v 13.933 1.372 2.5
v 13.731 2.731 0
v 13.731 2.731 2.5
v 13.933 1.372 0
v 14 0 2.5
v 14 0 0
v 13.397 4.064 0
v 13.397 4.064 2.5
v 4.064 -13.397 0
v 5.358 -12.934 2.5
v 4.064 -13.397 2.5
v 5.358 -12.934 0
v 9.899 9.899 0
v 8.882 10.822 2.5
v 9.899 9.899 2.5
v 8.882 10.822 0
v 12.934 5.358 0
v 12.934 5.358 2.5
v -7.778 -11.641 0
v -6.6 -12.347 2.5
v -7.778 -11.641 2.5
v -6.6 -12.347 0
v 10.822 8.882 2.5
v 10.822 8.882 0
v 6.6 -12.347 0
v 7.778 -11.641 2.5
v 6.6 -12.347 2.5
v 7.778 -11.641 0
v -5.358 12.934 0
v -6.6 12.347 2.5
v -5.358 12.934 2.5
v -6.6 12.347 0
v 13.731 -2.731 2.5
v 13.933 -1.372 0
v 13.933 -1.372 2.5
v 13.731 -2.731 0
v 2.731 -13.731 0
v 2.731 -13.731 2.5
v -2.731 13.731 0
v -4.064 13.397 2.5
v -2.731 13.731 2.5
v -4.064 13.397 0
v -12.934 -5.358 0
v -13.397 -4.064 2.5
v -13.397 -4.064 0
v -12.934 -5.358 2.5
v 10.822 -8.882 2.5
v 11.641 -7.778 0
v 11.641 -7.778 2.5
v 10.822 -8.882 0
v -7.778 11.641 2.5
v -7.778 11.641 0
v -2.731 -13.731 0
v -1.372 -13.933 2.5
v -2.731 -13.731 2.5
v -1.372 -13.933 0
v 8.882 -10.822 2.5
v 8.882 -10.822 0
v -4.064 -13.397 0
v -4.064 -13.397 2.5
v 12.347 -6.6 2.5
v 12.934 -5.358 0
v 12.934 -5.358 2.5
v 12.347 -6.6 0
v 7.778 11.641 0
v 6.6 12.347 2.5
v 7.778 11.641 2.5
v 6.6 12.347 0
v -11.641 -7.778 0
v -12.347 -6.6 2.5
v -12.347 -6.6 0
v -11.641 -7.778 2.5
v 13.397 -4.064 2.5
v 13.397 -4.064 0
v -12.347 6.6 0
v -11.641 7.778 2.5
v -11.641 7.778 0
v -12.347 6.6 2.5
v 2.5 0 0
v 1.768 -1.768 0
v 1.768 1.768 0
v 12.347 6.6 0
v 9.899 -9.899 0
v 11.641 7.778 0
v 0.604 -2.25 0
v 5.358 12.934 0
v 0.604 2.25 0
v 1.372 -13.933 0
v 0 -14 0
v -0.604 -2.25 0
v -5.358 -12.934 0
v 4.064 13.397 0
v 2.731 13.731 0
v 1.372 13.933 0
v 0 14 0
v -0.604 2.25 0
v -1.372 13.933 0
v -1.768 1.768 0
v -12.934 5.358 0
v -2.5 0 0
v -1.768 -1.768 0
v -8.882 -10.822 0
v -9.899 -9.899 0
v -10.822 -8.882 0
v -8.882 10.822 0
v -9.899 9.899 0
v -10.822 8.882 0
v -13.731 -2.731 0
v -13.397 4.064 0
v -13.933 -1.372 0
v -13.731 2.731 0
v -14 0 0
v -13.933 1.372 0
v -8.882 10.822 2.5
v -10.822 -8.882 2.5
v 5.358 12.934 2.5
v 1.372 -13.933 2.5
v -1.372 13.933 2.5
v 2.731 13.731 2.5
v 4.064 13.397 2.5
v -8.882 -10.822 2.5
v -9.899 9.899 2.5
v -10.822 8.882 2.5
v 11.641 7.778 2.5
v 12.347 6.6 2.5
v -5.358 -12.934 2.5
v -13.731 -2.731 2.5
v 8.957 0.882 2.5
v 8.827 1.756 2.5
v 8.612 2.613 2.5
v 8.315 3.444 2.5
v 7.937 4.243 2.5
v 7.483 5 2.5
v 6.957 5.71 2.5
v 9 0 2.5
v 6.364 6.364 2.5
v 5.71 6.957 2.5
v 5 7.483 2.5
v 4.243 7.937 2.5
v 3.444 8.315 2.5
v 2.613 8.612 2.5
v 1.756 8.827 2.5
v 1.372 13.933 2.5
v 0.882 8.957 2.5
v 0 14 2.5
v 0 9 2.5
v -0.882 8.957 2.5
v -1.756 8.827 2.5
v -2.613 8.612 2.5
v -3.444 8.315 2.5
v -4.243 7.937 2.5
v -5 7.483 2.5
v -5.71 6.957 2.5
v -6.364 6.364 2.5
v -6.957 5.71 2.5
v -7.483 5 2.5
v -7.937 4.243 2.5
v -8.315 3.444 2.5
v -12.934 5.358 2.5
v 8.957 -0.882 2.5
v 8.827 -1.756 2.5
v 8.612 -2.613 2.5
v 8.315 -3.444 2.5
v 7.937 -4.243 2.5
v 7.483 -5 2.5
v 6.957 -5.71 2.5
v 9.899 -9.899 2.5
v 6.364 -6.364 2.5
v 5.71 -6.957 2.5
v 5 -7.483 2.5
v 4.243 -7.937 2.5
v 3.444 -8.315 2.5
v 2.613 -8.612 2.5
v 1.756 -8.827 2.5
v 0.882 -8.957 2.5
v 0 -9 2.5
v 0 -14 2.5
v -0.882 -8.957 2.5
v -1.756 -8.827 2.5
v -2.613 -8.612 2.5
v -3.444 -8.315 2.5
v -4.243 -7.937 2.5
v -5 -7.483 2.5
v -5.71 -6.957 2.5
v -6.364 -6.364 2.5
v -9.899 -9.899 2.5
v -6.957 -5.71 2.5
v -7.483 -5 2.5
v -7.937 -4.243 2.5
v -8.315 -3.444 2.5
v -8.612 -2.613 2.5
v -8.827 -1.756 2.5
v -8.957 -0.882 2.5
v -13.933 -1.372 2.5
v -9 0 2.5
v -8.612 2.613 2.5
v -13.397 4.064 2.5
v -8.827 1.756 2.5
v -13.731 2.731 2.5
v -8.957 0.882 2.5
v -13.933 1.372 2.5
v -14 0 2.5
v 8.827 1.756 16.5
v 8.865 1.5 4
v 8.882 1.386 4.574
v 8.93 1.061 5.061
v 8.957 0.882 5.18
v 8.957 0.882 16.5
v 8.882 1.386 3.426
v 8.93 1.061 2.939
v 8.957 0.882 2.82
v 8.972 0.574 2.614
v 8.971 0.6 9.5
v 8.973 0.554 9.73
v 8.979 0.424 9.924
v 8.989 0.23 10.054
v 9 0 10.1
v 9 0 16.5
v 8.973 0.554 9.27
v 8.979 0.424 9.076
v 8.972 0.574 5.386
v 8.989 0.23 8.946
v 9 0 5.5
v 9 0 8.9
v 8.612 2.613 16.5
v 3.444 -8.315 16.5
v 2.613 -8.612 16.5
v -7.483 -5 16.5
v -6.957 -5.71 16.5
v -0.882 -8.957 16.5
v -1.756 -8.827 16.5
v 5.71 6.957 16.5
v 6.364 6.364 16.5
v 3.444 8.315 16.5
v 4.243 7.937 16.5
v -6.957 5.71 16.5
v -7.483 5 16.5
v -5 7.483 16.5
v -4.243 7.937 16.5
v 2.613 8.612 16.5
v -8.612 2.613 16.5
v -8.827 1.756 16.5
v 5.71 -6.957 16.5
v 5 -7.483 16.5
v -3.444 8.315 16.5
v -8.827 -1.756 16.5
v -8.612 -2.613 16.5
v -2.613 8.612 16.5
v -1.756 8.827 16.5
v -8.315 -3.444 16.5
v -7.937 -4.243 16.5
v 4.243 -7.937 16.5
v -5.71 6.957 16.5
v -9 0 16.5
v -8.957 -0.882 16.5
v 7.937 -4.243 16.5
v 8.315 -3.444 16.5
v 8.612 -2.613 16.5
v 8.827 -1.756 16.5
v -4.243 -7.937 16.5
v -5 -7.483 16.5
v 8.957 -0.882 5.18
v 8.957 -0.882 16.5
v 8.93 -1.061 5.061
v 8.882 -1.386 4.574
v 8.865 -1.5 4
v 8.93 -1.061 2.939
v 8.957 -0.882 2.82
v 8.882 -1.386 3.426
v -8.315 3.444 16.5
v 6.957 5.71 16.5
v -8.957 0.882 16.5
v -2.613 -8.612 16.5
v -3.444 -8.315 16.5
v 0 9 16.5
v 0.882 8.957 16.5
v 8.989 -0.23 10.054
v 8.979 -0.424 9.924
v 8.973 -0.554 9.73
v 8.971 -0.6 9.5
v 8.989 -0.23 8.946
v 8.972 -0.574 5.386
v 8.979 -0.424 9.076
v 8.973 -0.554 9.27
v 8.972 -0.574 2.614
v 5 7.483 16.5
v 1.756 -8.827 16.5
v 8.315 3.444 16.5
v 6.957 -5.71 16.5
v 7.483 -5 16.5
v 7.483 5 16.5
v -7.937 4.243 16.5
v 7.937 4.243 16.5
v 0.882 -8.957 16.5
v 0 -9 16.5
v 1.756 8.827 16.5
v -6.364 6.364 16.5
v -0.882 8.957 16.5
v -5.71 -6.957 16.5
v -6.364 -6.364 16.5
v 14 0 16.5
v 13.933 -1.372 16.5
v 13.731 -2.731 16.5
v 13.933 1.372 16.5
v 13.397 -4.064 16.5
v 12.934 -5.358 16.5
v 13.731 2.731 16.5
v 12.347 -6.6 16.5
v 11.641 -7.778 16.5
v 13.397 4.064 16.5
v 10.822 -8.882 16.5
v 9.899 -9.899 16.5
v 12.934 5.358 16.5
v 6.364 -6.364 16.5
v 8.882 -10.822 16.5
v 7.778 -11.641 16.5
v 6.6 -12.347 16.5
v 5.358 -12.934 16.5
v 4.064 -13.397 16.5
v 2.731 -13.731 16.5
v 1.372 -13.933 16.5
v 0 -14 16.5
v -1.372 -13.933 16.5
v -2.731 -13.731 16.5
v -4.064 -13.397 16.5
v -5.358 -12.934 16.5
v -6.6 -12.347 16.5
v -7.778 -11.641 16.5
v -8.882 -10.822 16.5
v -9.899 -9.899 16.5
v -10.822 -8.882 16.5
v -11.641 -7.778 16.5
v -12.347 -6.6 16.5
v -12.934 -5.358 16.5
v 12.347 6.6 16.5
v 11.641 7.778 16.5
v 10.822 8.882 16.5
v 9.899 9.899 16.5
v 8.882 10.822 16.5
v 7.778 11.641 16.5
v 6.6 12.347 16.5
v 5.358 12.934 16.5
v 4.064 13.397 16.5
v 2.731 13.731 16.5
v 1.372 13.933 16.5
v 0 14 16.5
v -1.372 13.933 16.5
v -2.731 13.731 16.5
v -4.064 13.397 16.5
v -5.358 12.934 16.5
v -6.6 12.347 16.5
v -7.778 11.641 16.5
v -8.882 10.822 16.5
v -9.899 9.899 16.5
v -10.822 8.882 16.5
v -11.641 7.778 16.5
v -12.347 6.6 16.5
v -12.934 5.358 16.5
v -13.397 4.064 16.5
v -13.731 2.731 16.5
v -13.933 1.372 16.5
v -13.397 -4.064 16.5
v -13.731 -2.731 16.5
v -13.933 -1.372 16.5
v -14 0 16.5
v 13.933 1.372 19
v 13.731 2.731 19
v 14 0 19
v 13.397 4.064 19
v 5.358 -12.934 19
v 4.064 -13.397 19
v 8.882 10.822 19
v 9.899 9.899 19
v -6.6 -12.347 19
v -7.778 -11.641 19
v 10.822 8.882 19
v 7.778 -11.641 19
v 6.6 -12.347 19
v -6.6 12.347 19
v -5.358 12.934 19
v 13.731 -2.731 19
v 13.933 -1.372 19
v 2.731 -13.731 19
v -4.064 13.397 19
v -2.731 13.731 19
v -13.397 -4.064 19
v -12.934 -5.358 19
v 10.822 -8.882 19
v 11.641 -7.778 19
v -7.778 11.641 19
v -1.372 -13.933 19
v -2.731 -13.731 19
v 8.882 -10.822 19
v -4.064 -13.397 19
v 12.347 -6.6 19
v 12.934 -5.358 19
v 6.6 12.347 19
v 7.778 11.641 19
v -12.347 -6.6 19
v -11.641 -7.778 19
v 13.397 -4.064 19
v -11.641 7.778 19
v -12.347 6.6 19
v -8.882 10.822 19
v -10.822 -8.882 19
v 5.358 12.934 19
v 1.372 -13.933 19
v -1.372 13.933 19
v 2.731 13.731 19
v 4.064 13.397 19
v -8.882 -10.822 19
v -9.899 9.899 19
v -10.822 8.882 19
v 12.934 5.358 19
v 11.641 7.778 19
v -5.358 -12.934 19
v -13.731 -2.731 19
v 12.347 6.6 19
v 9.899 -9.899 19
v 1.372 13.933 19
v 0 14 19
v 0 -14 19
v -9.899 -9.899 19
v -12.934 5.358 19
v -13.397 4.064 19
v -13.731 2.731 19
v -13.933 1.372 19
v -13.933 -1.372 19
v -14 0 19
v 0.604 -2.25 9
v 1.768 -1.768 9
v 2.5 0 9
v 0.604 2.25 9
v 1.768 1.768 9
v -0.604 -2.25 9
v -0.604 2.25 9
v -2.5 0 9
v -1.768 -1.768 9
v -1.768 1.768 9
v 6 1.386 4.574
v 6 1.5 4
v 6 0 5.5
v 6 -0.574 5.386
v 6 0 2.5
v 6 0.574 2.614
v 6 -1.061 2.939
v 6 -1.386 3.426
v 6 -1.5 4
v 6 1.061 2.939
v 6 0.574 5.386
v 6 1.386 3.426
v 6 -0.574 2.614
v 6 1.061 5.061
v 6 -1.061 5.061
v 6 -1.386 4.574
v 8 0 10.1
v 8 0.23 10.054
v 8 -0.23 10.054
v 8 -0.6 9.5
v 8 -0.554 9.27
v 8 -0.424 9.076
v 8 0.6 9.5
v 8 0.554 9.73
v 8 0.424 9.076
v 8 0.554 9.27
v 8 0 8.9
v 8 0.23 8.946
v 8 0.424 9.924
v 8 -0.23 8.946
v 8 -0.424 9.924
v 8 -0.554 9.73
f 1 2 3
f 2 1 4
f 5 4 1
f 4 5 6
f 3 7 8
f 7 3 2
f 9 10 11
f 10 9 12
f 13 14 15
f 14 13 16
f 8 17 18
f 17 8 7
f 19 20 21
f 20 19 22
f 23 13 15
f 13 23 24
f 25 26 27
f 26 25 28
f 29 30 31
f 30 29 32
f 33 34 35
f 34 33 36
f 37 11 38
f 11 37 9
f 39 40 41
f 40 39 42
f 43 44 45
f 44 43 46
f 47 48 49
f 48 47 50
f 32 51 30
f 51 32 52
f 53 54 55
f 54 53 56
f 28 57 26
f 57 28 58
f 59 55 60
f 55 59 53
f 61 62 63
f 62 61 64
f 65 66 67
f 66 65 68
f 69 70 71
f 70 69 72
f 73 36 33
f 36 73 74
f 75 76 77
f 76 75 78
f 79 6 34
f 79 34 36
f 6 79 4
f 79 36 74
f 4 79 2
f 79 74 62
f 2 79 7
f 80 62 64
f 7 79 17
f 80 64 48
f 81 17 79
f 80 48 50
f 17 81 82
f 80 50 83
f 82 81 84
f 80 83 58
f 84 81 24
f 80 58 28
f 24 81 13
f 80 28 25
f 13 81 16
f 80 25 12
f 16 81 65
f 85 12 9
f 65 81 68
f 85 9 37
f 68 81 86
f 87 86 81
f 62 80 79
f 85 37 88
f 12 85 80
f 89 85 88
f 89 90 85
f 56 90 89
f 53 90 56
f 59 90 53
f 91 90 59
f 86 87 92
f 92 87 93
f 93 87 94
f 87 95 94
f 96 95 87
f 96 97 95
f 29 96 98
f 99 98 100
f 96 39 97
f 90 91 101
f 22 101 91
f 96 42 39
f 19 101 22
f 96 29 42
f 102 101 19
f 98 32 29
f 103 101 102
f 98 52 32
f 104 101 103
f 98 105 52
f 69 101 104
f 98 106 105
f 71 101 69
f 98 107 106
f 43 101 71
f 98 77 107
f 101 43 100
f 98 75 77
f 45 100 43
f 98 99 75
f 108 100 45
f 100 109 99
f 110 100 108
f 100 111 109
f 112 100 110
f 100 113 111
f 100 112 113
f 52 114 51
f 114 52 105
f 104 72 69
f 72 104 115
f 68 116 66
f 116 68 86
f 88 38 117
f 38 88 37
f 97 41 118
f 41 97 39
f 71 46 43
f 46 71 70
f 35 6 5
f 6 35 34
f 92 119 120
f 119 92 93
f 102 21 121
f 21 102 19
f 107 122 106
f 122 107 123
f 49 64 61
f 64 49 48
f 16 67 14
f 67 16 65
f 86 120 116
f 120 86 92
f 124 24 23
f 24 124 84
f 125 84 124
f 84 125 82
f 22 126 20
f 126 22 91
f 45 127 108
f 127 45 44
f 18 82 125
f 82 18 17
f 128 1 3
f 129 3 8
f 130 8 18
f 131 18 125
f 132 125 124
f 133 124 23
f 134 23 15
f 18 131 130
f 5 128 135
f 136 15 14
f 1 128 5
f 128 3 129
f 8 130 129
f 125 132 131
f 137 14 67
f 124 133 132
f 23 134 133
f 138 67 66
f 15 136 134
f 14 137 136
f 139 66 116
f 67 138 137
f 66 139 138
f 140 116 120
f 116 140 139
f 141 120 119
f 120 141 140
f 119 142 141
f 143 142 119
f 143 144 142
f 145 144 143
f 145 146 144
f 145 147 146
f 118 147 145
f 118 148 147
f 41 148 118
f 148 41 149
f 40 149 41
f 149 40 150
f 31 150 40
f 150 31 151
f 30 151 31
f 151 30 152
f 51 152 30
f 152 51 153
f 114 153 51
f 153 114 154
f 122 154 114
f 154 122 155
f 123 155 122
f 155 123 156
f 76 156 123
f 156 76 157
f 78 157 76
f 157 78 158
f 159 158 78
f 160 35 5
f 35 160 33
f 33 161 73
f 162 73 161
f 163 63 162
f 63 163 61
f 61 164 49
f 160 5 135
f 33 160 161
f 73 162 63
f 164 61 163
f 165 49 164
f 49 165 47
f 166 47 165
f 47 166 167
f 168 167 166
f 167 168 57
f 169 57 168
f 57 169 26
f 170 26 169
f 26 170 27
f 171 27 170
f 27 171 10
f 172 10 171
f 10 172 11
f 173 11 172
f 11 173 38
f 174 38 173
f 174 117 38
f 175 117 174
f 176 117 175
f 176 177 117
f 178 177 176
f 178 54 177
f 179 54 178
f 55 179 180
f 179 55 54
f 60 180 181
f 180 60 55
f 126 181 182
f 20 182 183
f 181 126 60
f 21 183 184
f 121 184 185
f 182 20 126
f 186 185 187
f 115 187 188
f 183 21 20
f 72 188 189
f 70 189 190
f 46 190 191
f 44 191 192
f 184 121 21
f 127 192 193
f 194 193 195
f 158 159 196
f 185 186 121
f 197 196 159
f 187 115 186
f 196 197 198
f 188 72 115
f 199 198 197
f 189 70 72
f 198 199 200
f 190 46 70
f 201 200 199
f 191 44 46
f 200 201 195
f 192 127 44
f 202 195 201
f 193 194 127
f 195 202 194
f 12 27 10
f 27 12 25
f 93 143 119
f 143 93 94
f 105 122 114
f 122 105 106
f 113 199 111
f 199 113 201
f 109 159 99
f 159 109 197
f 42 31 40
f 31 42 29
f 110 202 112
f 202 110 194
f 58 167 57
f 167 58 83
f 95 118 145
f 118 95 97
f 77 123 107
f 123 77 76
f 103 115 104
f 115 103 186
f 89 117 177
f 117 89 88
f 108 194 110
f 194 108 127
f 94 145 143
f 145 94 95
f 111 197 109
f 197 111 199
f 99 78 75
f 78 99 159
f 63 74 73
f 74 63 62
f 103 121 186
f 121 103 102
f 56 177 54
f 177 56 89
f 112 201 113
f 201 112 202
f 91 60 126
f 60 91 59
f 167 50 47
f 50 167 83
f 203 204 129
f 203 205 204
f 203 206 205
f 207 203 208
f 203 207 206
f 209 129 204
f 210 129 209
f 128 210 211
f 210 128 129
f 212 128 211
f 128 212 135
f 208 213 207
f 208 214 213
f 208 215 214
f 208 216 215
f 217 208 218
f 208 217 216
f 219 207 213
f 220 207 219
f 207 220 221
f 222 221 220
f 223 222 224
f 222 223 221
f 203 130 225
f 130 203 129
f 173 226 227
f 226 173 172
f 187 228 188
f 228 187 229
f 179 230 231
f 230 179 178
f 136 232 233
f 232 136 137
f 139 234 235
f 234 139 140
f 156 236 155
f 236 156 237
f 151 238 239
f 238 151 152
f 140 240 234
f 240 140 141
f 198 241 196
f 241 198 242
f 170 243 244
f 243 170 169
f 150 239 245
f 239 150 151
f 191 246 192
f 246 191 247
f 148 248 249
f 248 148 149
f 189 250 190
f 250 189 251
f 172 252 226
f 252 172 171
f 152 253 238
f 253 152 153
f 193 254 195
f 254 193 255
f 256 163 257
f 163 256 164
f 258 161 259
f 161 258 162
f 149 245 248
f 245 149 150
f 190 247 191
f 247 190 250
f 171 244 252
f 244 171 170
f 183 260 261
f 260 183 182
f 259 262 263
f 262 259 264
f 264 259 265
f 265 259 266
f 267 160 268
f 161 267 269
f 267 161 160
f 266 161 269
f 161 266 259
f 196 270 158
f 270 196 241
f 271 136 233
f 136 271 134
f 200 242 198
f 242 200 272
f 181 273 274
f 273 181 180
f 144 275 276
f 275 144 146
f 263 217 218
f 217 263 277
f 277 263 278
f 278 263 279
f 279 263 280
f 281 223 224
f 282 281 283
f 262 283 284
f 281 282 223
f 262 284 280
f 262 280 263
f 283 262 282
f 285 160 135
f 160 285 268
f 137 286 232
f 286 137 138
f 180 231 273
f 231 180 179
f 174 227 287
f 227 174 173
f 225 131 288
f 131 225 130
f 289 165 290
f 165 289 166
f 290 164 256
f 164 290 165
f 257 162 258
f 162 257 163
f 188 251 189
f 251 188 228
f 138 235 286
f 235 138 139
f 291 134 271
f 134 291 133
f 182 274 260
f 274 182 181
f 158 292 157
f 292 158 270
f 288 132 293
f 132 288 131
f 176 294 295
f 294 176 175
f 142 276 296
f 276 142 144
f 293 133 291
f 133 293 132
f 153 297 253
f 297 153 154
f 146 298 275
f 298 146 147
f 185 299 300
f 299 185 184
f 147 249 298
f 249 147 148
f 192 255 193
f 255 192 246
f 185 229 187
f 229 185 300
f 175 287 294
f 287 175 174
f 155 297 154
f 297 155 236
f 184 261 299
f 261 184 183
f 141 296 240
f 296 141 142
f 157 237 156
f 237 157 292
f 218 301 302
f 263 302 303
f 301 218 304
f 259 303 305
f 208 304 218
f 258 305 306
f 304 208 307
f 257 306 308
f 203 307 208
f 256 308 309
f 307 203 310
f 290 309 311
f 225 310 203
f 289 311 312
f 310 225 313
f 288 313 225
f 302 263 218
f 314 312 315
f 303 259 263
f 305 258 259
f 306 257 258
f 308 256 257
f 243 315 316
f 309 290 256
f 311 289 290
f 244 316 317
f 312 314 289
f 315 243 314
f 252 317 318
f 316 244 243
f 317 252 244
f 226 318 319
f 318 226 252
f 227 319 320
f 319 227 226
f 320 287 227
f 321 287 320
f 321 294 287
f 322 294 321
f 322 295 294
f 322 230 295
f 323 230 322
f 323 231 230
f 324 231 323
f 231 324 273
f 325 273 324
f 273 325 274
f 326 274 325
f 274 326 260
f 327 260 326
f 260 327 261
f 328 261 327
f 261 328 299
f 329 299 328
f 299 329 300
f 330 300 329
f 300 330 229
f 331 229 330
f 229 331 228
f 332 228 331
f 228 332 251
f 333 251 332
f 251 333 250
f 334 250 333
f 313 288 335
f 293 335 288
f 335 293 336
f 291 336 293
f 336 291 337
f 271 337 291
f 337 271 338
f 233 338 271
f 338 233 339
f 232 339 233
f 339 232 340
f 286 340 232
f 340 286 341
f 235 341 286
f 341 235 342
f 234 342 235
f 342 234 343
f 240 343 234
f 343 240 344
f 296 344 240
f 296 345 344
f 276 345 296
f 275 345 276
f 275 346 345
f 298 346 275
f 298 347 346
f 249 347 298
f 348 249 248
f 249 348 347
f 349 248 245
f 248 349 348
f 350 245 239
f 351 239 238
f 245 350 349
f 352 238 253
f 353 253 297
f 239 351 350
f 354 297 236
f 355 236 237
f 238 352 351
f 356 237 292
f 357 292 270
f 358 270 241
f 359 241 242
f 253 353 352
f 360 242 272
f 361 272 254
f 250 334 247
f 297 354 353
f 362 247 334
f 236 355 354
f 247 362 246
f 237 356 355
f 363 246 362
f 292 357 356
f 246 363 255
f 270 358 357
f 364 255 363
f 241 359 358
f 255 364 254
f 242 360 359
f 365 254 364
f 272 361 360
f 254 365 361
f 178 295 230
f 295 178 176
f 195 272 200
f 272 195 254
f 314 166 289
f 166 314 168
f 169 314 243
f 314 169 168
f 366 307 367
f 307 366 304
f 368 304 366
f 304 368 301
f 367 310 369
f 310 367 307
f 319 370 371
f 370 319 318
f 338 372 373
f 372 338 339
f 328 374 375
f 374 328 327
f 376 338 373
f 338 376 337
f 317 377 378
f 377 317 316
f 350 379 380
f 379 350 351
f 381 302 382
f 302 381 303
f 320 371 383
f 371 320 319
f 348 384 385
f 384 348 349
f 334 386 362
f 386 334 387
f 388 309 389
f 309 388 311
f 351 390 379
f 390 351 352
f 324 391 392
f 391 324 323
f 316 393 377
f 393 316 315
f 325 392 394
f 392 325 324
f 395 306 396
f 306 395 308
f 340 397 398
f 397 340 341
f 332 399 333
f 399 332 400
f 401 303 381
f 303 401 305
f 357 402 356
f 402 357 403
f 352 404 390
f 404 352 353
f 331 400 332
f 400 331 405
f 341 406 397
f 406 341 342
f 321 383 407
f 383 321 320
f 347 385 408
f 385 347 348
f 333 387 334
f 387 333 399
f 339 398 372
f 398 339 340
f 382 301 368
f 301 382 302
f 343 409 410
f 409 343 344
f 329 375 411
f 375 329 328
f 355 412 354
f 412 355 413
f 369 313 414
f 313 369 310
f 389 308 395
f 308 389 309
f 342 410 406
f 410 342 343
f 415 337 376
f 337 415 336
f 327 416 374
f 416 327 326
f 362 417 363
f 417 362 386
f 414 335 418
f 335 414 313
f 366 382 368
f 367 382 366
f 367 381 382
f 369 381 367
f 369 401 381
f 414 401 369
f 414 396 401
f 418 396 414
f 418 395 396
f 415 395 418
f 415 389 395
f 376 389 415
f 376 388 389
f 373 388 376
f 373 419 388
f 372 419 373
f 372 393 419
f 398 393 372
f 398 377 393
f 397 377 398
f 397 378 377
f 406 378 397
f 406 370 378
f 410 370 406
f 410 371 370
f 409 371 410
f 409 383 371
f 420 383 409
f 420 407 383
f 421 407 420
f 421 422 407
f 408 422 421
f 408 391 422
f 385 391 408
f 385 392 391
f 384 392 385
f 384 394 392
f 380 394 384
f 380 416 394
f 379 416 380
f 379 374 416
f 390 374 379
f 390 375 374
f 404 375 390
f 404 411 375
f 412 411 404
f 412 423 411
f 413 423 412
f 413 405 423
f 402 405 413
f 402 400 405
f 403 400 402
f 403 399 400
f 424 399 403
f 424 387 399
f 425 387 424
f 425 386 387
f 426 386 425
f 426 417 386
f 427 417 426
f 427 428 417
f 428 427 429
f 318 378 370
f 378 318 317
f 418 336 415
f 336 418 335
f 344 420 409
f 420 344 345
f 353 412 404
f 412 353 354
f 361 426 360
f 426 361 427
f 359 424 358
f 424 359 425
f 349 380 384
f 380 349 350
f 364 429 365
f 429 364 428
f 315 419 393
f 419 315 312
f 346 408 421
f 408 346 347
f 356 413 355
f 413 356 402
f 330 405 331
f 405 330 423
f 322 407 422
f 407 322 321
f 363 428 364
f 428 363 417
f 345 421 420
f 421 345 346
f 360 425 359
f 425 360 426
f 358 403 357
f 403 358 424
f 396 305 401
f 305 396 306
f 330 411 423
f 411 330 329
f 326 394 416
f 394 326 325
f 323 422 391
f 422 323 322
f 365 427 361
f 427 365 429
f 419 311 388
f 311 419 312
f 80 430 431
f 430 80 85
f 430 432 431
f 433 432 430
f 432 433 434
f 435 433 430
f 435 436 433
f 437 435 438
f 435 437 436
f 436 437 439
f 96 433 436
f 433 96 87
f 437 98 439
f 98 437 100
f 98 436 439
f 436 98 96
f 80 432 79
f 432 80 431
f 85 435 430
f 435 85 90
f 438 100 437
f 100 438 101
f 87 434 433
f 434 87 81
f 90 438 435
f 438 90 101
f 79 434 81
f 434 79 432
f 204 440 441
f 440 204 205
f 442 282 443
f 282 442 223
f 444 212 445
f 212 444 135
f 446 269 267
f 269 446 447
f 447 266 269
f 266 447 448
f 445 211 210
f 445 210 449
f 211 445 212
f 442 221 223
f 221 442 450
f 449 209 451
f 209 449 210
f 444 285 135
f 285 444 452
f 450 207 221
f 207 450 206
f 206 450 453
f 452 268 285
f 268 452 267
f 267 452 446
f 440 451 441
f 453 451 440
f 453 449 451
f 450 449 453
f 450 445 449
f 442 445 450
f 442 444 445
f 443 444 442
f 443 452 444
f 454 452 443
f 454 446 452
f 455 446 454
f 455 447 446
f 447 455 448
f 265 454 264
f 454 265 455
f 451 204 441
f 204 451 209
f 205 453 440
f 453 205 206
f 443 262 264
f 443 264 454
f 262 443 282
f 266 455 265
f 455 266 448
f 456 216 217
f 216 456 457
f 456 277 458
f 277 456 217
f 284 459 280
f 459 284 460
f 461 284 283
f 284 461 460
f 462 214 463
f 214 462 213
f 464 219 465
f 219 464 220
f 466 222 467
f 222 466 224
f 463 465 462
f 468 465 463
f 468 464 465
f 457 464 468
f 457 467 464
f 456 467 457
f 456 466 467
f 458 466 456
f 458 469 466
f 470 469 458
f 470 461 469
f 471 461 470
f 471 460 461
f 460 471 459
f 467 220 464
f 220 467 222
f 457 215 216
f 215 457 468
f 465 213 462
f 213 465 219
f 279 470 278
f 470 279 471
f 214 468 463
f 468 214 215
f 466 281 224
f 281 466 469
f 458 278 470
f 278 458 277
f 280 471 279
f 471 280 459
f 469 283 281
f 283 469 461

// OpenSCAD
// SpiderPi Spool v1 - Direct mount to NEMA17 5mm shaft
// Target effective radius: ~11mm after line wrapping
// Designed for 0.8-1.0mm Dyneema braid

// Parameters
shaft_d = 5.0;         // NEMA17 shaft diameter (mm)
shaft_flat = 4.5;      // Shaft flat side (mm)
hub_d = 12.0;          // Hub outer diameter
hub_h = 8.0;           // Hub height
flange_d = 28.0;       // Flange outer diameter
flange_t = 2.5;        // Flange thickness
barrel_d = 18.0;       // Cable barrel diameter (sets effective radius ~9-11mm)
barrel_h = 14.0;       // Cable wrap height
line_anchor_d = 1.2;   // Cable anchor hole diameter
set_screw_d = 3.0;     // M3 set screw hole

module shaft_profile() {
    intersection() {
        circle(d = shaft_d);
        square([shaft_d, shaft_flat], center = true);
    }
}

module spool() {
    difference() {
        union() {
            // Bottom flange
            cylinder(d = flange_d, h = flange_t, $fn=64);
            // Barrel
            translate([0, 0, flange_t])
                cylinder(d = barrel_d, h = barrel_h, $fn=64);
            // Top flange
            translate([0, 0, flange_t + barrel_h])
                cylinder(d = flange_d, h = flange_t, $fn=64);
            // Hub
            cylinder(d = hub_d, h = hub_h, $fn=32);
        }
        // Shaft bore with flat
        linear_extrude(hub_h + 1)
            shaft_profile();
        // Set screw hole
        translate([hub_d/2, 0, hub_h/2])
            rotate([0, 90, 0])
                cylinder(d = set_screw_d, h = hub_d, $fn=16);
        // Line anchor hole
        translate([barrel_d/2 - 1, 0, flange_t + barrel_h/2])
            rotate([0, 90, 0])
                cylinder(d = line_anchor_d, h = 5, $fn=16);
    }
}

spool();
// Print in PETG or ABS for best results. PLA acceptable for light loads.
// After printing, measure actual barrel diameter to set spool_radius_m in config.
